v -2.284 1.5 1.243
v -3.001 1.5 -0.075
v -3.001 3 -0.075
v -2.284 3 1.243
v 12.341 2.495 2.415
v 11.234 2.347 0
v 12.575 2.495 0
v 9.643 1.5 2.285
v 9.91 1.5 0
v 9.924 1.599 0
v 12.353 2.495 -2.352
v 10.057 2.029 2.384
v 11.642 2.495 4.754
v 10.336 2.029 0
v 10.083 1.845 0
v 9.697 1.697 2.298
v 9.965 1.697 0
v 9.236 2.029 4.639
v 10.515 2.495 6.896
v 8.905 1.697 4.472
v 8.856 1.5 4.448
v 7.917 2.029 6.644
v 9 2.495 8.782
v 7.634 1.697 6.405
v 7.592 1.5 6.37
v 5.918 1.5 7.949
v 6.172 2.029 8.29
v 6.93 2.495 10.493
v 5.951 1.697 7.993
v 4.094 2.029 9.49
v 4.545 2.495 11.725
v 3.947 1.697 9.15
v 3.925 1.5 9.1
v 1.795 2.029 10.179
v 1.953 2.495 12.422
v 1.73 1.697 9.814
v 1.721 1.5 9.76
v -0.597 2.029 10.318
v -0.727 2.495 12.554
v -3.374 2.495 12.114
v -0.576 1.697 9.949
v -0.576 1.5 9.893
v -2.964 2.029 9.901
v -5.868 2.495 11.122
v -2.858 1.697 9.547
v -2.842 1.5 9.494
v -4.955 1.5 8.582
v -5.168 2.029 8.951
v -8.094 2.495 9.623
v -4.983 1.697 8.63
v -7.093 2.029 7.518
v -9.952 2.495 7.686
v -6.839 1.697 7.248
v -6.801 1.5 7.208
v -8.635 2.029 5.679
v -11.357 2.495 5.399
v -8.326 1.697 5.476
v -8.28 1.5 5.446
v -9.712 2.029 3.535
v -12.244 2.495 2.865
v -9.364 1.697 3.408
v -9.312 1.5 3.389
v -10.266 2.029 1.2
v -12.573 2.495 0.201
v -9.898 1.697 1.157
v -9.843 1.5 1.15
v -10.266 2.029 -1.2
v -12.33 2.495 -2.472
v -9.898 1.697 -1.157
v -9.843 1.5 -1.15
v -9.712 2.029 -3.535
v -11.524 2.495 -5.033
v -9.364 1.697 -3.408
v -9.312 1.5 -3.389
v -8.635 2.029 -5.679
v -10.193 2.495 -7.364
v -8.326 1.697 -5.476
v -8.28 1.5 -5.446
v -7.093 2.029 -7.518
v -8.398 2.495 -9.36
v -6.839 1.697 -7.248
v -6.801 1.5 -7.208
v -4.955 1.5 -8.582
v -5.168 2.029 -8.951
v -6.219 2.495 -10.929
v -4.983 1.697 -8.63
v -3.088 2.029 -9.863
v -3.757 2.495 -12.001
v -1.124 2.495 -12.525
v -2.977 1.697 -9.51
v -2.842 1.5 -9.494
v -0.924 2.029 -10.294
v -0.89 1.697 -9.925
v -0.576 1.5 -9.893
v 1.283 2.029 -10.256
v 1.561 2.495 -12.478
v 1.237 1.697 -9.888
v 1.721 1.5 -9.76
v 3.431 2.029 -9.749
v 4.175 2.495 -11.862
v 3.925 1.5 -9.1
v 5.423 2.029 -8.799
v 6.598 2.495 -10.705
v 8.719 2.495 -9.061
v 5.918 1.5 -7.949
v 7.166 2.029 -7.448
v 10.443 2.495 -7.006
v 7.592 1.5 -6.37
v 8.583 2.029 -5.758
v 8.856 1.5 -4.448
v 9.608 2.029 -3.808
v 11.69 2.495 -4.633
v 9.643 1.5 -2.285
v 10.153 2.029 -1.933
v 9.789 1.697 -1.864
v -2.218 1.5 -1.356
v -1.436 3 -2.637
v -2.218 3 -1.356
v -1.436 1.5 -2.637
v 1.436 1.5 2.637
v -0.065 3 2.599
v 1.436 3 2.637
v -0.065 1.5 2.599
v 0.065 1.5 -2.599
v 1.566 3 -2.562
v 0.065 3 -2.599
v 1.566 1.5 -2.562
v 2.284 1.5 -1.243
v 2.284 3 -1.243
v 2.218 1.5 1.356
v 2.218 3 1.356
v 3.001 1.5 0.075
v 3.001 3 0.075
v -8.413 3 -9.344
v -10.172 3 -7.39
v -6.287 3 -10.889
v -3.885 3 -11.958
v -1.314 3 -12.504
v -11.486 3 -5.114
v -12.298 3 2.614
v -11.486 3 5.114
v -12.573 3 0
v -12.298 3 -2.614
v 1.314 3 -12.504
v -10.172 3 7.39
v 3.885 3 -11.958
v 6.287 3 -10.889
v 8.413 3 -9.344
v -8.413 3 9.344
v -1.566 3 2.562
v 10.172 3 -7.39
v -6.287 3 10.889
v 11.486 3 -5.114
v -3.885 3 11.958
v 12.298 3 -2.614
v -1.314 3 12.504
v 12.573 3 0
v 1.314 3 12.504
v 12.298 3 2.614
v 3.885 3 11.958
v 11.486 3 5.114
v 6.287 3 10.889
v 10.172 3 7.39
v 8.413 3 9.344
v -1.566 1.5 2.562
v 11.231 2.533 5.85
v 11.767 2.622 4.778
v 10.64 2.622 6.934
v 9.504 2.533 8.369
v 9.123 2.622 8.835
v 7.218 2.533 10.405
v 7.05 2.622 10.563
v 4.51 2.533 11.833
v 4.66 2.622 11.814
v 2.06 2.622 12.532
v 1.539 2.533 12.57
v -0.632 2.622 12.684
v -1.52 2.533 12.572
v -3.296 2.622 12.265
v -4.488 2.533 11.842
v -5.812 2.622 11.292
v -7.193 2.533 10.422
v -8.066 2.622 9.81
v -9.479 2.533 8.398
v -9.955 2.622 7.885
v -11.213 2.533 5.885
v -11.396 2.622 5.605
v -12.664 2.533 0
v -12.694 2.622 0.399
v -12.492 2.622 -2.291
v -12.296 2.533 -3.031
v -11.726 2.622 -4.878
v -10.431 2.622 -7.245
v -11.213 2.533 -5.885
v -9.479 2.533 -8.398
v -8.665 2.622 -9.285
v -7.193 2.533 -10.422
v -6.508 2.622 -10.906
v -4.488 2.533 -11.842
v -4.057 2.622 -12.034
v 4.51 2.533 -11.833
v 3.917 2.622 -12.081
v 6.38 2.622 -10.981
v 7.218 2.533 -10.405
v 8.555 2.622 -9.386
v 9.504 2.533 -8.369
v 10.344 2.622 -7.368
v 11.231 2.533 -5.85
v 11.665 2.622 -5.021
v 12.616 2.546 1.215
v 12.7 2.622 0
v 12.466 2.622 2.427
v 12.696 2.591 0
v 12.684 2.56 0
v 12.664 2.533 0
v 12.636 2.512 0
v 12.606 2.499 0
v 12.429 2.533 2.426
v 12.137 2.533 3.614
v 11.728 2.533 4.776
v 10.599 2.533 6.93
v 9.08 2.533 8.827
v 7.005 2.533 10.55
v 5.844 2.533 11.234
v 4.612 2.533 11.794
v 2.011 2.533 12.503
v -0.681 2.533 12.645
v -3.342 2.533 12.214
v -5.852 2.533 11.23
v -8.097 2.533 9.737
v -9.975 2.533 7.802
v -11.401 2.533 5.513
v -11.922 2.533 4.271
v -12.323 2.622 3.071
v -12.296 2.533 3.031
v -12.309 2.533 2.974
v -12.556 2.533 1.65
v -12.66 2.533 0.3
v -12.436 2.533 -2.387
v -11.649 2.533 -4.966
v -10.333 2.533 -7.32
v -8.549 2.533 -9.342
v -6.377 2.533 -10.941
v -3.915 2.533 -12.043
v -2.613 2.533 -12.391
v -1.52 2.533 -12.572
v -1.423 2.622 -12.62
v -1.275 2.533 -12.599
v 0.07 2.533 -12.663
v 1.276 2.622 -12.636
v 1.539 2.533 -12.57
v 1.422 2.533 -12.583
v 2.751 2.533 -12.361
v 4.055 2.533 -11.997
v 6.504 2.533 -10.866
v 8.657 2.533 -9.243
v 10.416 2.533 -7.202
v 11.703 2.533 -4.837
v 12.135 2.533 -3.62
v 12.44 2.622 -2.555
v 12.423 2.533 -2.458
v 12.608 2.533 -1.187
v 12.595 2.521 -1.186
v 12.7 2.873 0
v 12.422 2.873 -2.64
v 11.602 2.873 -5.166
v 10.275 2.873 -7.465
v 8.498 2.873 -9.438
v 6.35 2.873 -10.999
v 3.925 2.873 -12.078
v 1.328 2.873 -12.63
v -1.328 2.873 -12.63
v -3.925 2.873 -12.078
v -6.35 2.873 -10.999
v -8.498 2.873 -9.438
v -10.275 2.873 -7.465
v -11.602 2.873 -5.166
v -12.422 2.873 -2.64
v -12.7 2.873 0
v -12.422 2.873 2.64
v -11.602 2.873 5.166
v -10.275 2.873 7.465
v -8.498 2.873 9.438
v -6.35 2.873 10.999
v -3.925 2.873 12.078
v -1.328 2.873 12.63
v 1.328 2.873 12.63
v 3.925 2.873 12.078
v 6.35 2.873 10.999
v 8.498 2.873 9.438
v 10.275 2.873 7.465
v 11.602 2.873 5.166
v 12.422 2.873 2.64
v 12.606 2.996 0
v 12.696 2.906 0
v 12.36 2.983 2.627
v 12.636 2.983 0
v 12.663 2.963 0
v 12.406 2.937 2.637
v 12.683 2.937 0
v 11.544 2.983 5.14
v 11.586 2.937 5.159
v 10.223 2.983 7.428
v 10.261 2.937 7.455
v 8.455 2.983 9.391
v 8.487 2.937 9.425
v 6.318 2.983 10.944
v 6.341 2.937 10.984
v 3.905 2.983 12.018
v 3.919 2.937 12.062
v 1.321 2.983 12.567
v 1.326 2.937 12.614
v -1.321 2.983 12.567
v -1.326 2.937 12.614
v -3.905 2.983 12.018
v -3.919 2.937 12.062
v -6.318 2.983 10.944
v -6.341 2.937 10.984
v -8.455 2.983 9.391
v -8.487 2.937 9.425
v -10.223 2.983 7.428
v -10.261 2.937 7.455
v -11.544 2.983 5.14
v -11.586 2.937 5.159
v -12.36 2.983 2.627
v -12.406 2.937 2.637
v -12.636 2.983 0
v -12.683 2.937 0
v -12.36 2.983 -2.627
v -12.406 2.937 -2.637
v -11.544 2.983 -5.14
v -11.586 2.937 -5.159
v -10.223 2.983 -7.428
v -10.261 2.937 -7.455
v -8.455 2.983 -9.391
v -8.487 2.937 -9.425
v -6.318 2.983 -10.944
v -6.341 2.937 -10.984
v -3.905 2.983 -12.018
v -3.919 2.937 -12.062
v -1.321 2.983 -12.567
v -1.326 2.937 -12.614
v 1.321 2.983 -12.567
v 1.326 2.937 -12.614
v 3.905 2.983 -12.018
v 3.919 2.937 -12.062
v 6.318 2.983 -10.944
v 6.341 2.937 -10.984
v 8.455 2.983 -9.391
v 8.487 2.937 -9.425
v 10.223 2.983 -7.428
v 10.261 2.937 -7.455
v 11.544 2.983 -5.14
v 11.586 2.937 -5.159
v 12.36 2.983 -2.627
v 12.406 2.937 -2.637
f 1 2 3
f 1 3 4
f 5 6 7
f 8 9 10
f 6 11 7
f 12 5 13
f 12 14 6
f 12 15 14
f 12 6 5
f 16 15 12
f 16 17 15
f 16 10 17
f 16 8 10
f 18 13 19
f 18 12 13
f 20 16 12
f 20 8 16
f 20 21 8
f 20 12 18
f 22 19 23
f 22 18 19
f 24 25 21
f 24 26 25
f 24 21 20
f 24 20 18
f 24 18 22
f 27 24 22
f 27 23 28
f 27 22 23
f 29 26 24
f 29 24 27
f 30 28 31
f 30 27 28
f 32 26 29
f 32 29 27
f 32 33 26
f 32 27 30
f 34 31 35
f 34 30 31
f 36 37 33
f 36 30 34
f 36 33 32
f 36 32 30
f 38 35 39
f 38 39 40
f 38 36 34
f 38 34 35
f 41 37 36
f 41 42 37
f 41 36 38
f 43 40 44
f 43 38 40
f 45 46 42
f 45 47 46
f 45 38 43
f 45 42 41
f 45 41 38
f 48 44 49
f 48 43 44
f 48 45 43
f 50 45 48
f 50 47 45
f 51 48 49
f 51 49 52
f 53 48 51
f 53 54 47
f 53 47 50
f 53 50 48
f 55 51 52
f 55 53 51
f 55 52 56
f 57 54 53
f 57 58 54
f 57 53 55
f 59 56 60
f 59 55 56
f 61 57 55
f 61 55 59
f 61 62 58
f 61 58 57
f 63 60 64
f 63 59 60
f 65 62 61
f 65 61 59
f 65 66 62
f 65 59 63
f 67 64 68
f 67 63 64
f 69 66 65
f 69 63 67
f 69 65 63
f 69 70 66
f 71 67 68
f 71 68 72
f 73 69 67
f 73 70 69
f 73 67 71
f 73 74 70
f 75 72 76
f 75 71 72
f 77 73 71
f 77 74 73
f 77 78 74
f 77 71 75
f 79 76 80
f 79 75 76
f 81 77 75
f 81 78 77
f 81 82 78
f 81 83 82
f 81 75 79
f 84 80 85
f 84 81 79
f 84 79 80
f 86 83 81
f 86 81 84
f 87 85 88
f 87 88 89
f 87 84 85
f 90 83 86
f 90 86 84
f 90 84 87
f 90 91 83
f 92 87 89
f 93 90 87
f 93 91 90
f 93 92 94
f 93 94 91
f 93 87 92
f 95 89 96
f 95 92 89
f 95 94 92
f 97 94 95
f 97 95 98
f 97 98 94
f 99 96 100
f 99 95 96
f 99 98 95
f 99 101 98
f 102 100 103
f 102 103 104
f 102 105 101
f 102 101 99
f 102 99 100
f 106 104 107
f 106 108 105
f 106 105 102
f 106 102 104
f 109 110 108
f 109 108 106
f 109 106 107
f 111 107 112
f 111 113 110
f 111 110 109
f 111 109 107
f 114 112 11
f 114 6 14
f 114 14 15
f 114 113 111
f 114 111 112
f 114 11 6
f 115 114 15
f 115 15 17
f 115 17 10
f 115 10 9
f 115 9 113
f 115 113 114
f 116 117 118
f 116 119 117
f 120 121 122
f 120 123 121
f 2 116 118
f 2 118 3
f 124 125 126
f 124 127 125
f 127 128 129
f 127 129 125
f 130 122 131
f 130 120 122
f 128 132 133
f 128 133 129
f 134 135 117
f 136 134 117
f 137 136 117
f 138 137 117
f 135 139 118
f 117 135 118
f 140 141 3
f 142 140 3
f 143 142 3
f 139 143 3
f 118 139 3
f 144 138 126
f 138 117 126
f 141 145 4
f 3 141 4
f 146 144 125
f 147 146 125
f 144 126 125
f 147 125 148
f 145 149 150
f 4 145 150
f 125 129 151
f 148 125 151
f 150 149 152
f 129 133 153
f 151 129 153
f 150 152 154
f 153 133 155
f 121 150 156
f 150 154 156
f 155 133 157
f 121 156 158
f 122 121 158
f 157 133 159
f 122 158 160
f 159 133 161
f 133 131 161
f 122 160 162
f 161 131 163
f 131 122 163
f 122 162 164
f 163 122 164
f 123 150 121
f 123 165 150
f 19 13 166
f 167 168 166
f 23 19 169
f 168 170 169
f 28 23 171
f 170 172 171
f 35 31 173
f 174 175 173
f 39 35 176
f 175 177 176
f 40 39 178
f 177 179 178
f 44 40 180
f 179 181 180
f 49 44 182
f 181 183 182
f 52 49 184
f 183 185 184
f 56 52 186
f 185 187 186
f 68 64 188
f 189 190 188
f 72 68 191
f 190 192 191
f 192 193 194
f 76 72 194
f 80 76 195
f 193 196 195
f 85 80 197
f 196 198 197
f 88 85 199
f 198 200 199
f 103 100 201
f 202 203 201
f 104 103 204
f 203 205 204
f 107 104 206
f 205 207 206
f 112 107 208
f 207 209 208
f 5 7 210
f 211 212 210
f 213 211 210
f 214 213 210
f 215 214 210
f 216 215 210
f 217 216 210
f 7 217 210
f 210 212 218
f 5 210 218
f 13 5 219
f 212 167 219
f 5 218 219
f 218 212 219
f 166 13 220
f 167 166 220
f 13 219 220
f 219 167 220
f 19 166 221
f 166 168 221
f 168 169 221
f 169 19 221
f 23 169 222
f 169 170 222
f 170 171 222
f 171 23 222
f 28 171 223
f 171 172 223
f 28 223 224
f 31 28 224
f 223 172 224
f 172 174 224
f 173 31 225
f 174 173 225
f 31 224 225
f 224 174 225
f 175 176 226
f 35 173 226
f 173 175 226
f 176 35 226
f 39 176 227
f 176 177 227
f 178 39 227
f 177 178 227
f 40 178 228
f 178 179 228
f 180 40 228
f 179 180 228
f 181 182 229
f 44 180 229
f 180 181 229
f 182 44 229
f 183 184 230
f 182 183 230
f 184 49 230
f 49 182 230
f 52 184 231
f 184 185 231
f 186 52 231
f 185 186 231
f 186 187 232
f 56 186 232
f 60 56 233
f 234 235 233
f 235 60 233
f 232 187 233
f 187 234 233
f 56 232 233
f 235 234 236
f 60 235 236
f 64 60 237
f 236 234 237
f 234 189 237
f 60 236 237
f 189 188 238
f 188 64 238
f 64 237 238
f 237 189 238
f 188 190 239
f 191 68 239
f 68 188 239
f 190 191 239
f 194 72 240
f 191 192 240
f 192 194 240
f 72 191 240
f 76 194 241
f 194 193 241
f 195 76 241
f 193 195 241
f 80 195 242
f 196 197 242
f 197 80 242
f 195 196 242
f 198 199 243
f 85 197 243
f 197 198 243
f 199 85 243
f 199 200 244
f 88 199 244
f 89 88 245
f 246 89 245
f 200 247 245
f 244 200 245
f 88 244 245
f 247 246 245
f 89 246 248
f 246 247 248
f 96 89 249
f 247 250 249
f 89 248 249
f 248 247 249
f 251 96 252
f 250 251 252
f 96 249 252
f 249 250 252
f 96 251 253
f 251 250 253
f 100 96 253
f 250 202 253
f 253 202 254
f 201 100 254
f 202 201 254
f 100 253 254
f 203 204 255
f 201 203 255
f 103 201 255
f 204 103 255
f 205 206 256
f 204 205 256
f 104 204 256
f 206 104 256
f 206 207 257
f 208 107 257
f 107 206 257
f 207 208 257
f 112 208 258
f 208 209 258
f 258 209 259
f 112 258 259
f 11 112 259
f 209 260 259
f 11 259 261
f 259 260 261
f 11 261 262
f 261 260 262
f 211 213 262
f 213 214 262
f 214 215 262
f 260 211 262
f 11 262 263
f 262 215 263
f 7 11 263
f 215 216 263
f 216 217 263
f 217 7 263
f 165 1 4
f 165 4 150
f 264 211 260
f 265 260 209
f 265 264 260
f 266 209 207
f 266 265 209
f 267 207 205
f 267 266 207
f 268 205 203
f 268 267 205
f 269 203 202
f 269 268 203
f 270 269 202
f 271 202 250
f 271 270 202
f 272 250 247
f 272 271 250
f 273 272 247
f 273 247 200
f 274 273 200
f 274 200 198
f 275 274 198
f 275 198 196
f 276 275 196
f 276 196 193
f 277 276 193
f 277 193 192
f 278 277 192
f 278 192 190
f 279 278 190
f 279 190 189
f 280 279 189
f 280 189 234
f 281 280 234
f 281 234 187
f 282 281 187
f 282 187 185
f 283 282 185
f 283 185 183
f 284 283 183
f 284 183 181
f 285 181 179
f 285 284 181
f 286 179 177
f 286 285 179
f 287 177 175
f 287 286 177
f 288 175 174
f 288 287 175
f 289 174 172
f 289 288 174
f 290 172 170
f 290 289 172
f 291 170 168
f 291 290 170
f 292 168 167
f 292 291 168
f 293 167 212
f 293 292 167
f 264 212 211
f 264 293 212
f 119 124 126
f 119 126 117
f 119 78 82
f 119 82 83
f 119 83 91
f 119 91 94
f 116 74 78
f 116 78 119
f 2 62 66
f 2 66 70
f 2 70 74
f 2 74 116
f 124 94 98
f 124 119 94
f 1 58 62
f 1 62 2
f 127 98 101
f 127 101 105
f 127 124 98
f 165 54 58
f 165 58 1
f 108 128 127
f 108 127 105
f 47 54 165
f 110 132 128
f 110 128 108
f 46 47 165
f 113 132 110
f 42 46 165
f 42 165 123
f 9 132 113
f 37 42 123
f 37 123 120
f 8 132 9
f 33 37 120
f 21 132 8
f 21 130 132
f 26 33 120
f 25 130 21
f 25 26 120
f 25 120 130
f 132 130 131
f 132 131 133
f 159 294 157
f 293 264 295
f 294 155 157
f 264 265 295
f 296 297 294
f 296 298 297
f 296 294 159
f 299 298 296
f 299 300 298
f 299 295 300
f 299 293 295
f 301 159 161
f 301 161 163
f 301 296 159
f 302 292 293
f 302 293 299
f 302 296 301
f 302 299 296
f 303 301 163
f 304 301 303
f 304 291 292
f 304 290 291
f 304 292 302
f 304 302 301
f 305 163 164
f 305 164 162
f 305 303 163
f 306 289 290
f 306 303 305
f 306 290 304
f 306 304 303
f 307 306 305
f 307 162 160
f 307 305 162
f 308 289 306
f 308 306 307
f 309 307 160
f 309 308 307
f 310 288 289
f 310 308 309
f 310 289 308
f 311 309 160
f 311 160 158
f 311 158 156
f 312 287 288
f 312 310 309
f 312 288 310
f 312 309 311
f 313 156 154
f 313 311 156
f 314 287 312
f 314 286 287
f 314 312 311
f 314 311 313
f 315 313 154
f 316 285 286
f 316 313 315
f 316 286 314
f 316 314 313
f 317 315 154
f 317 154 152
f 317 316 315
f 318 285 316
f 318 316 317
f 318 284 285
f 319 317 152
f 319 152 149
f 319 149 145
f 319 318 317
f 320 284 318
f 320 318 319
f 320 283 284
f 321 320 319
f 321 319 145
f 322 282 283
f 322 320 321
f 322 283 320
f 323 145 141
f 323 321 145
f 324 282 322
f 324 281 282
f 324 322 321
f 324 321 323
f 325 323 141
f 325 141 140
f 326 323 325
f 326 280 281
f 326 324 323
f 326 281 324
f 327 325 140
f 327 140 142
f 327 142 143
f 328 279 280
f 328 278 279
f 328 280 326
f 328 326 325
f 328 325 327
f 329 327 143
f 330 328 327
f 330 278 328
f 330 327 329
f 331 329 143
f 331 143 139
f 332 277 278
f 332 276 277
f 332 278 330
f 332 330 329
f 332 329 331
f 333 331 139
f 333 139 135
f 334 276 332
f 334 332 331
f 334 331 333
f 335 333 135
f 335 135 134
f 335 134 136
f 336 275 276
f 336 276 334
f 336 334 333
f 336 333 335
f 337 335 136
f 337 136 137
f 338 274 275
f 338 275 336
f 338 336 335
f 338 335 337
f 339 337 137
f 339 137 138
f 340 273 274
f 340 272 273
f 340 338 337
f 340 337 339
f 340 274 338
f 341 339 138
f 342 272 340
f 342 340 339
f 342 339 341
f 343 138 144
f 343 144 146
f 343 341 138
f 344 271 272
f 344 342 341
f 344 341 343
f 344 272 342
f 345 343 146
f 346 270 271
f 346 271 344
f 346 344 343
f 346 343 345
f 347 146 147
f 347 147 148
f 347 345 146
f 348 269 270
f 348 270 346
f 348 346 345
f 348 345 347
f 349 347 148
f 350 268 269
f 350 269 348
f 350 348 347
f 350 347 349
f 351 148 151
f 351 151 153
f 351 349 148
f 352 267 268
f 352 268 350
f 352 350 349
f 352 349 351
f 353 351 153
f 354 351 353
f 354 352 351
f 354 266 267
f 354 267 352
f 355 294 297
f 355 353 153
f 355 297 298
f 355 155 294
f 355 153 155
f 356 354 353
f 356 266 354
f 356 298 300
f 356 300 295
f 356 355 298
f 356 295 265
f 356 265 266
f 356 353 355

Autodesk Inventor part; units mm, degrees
ref_plane "YZ Plane" through (0, 0, 0) normal (1, 0, 0) x (0, 1, 0)
ref_plane "XZ Plane" through (0, 0, 0) normal (0, 1, 0) x (-1, 0, 0)
ref_plane "XY Plane" through (0, 0, 0) normal (0, 0, 1) x (1, 0, 0)
sketch "Sketch1" plane through (0, 0, 0) normal (0, 0, 1) x (1, 0, 0)
  line L0 (0, 0) -> (12.7, 0)
  line L1 (12.7, 0) -> (12.7, 3)
  line L2 (12.7, 3) -> (0, 3)
  line L3 (0, 3) -> (0, 0)
  ellipse E0 centre (12.7, 1.5) end of major axis (9.9101, 1.5) minor radius 0.9957
  point P0 (12.7, 0.5043)
  point P1 (12.7, 2.4957)
  dimension "d0" = 12.7
  dimension "d1" = 3
revolve "Revolution1" add sketch "Sketch1" angle 360 about axis through (0, 3, 0) along (0, -1, 0) contours L3 L2 L1 E0 L0
fillet "Fillet1" radius 0.127 4 edges at (-12.7, 3, 0) (-12.7, 2.4957, 0) (-12.7, 0.5043, 0) (-12.7, 0, 0)
sketch "Sketch2" plane through (0, 0, 0) normal (0, -1, 0) x (1, 0, 0)
  circle A0 centre (0, 0) radius 2.6
  line L0 (1.5658, -2.5616) -> (-1.4355, -2.6368)
  line L1 (-1.4355, -2.6368) -> (-3.0013, -0.0752)
  line L2 (-3.0013, -0.0752) -> (-1.5658, 2.5616)
  line L3 (-1.5658, 2.5616) -> (1.4355, 2.6368)
  line L4 (1.4355, 2.6368) -> (3.0013, 0.0752)
  line L5 (3.0013, 0.0752) -> (1.5658, -2.5616)
  point P0 (2.2835, -1.2432)
  dimension "d4" = 5.2
extrude "Extrusion1" cut sketch "Sketch2" against normal through all
sketch "Sketch3" plane through (0, 0, 0) normal (0, -1, 0) x (1, 0, 0)
  circle A0 centre (0, 0) radius 22.3514
extrude "Extrusion2" cut sketch "Sketch3" against normal blind 1.5
properties part number "Pulley because david hates it_3DPrint"
